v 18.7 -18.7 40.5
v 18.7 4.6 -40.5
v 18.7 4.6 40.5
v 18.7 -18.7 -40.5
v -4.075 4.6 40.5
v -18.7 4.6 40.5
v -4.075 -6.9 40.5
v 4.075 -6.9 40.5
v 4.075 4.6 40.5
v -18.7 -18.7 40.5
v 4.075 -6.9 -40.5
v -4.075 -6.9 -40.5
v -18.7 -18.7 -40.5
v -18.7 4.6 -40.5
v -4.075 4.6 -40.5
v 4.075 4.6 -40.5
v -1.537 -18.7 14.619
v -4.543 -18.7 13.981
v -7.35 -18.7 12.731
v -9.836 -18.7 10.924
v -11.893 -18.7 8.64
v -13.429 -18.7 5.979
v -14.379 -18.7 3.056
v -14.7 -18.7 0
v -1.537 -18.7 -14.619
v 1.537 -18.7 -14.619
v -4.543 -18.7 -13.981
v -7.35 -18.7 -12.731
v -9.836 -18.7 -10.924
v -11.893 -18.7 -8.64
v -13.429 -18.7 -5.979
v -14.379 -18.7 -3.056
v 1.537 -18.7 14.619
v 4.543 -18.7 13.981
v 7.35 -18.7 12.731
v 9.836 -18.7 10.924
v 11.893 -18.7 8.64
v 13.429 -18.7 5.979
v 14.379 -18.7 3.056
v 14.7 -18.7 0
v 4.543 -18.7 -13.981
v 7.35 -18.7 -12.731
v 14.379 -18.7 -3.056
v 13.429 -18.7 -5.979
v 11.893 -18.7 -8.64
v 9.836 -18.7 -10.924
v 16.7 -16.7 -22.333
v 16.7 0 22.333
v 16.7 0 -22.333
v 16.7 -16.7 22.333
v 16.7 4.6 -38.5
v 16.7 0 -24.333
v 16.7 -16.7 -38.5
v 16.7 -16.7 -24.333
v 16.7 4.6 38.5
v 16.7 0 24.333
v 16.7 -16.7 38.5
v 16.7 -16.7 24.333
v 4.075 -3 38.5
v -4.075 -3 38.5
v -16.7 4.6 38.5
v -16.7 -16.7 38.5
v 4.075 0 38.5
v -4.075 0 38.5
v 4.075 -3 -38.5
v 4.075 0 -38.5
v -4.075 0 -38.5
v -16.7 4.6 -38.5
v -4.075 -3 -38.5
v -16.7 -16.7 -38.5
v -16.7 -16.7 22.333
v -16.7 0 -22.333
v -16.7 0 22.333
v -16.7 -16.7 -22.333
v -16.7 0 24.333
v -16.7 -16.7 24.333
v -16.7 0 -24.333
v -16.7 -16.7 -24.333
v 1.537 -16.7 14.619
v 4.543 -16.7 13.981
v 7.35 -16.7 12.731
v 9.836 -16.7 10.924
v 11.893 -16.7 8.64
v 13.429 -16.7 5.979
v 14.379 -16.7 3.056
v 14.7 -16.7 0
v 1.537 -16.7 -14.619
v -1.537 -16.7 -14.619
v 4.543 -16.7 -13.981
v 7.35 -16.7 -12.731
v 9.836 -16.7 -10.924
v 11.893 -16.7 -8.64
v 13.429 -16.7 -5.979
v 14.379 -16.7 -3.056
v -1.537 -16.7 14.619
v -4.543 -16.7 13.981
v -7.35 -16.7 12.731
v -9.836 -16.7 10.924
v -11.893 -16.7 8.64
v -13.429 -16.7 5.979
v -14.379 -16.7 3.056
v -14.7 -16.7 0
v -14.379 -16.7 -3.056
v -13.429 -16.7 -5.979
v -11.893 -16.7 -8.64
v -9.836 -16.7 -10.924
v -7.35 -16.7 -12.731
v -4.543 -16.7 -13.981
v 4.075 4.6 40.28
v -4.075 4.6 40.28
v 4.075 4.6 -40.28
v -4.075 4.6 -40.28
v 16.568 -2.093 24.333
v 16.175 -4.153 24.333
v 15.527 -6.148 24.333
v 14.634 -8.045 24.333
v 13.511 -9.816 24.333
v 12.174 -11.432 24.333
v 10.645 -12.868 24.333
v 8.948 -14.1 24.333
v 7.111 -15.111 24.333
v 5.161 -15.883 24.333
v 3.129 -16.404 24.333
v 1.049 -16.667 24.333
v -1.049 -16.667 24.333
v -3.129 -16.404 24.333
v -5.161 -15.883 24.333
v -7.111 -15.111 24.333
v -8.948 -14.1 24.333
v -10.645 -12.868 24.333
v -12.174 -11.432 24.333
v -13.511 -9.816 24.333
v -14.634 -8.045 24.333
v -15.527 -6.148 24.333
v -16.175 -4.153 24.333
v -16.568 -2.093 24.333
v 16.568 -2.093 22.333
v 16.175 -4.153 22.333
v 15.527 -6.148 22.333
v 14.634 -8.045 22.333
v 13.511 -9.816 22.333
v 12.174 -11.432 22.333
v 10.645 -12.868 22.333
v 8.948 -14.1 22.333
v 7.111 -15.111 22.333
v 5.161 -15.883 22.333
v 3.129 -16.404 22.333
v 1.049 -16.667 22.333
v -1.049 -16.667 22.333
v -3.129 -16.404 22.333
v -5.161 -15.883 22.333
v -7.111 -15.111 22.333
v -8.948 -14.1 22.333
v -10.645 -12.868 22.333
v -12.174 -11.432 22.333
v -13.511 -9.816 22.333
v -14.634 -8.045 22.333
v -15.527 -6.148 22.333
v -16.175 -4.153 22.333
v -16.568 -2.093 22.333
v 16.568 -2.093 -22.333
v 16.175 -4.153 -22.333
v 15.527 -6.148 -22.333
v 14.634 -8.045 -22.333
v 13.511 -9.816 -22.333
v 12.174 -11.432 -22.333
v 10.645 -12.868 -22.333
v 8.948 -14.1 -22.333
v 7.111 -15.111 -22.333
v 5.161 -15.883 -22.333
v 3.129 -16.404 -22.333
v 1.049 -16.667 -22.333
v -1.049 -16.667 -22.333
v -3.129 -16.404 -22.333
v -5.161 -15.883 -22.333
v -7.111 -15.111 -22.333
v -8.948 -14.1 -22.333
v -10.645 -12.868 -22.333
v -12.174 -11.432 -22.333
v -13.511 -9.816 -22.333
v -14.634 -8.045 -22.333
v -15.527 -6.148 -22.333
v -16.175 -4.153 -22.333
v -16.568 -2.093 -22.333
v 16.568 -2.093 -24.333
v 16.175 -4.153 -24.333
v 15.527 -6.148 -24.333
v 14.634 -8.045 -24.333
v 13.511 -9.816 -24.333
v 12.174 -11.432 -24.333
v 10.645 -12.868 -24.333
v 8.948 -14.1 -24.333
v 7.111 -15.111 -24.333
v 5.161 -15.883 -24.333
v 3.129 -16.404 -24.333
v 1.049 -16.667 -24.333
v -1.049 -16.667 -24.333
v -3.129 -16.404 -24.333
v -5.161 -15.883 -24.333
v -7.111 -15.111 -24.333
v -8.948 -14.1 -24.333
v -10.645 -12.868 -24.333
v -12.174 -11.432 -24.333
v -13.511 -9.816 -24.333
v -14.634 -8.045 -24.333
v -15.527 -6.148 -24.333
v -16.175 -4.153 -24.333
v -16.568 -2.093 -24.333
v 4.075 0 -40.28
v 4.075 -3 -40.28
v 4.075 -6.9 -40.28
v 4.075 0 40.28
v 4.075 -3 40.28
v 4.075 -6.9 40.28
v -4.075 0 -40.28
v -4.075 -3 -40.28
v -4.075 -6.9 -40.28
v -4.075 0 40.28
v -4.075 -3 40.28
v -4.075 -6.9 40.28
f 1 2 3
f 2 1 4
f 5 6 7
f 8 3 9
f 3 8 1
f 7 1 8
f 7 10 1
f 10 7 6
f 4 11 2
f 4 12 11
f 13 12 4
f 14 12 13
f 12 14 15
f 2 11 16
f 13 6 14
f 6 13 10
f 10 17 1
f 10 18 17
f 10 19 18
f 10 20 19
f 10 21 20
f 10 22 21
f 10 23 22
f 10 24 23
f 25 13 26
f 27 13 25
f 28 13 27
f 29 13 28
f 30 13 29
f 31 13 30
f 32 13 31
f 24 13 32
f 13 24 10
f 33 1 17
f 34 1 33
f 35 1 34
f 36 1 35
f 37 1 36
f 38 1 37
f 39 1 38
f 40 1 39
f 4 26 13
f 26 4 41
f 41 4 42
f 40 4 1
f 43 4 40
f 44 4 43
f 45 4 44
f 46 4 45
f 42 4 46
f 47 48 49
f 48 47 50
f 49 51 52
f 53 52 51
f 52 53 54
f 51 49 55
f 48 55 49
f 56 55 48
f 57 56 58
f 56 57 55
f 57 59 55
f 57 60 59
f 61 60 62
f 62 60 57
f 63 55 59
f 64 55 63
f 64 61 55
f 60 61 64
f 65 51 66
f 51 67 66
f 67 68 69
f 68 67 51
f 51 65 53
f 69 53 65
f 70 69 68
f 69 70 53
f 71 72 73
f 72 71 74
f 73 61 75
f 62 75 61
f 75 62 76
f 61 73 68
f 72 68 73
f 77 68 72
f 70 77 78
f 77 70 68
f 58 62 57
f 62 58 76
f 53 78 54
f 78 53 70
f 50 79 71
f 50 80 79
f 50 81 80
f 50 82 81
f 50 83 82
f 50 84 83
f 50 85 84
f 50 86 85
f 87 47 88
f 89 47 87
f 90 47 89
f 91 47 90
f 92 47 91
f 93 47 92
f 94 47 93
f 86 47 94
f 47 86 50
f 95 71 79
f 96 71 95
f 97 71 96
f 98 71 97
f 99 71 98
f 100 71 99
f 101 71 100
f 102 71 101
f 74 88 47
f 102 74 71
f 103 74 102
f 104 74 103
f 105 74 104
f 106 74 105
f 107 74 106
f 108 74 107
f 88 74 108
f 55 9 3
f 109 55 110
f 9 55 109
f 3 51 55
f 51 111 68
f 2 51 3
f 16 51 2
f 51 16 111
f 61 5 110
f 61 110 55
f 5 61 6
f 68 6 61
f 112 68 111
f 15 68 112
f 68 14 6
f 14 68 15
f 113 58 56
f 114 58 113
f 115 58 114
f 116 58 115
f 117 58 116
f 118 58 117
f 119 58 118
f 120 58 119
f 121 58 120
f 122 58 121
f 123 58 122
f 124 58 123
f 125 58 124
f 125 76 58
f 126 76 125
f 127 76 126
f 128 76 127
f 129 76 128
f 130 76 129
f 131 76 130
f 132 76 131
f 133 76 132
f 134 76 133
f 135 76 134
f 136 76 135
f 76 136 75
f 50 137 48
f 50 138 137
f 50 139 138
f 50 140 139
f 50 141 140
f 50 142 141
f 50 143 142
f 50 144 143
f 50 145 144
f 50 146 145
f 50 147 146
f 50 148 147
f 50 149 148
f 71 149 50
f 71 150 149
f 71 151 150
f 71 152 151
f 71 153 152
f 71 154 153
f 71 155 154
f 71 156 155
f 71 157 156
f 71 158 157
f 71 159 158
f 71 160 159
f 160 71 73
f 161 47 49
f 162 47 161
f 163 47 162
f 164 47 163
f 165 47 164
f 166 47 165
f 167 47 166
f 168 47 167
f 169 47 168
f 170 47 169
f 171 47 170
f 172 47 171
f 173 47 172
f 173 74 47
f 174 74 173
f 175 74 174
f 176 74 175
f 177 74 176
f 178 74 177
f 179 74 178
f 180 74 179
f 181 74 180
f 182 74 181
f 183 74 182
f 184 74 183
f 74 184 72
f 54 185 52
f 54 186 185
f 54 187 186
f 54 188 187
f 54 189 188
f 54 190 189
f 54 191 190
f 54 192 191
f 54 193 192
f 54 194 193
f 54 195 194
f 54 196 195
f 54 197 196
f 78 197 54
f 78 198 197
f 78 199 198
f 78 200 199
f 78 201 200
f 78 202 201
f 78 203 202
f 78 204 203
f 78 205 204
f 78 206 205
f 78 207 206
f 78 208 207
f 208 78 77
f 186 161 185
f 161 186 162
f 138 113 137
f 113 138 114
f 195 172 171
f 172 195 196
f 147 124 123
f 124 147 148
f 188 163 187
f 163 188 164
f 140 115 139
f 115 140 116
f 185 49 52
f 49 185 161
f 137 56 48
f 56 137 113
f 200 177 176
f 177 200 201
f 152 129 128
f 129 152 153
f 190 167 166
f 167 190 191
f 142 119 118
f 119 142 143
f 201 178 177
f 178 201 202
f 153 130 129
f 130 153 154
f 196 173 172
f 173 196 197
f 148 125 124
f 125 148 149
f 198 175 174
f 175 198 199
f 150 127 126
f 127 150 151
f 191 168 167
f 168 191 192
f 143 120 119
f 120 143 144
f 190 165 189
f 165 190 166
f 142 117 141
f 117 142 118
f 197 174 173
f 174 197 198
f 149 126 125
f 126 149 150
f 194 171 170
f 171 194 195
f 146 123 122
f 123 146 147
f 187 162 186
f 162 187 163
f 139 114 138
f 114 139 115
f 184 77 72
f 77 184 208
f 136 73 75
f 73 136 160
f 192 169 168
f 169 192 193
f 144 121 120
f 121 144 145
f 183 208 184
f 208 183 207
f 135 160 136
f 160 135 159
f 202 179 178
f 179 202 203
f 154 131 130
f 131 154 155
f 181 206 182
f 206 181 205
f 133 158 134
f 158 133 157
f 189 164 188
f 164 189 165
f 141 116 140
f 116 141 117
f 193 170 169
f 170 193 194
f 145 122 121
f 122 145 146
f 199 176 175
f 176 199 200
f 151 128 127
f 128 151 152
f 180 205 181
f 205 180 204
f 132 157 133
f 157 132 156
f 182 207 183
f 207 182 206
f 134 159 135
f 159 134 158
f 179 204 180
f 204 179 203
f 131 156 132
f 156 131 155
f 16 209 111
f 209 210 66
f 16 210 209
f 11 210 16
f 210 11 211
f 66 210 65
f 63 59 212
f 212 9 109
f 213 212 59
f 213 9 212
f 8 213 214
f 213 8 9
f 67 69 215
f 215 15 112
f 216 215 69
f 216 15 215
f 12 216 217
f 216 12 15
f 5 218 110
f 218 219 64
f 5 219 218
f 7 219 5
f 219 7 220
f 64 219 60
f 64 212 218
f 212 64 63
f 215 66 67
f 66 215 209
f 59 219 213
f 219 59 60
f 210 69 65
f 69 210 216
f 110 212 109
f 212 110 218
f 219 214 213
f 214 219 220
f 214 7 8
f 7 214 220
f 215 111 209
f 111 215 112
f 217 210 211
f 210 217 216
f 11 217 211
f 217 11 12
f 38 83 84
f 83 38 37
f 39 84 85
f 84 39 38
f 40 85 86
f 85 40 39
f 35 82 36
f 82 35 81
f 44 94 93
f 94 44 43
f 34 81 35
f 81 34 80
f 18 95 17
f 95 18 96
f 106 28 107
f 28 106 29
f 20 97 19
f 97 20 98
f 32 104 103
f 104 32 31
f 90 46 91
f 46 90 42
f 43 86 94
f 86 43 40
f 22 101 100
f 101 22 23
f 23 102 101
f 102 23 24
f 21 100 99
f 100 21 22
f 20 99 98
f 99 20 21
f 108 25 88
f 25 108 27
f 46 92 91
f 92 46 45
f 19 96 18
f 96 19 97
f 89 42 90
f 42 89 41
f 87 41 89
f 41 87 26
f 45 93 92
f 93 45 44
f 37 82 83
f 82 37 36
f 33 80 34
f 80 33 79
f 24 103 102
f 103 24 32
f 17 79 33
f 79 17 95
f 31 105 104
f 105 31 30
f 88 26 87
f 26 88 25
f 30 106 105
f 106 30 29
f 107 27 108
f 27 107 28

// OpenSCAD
// printer-specific fudge setting to allow enough clearance
diameter_fudge = 0.4;

// cell dimensions, measured to 32860 cell in-hand
cell_diameter = 33 + diameter_fudge;
cell_height = 70;

// configured for Keystone "209" clip:
clip_gap = 3.5; // gap between wall of holder and battery where spring clip sits, compressed size
clip_wall = 1.78; // width of printed wall onto which clip clips
clip_top_wall_to_hook = 4.6; // minimum distance between edge of clip wall and hook on clip
clip_width = 8.15;
clip_height = 11.5;

// holder dimensions
wall_thickness = 2.0;

// calculated dimensions
box_width = cell_diameter + wall_thickness*2;
box_height = cell_height + clip_gap*2 + wall_thickness*2;
box_depth = cell_diameter + wall_thickness*2;
hole_width = cell_diameter;
hole_height = cell_height + clip_gap*2;
hole_depth = cell_diameter;

// transparent battery image
module battery(cell_height, cell_diameter) {
    cylinder(h=cell_height, d=cell_diameter, center=true, $fn=50);
}
//%battery(cell_height, cell_diameter);


difference(){
    // positive shapes
    union(){
        // main box shape
        difference(){
            cube([box_width, box_depth, box_height], center=true); // box outside
            cube([hole_width, hole_depth, hole_height], center=true); // box cutout
            translate([0,box_depth/2+clip_top_wall_to_hook,0]){cube([box_width+1, box_depth, box_height+1], center=true);} // box top cut off
        }
        // mid supports
        translate([0,-box_depth/4,cell_height/3]){cube([box_width, box_depth/2, wall_thickness],center=true);}
        translate([0,-box_depth/4,-cell_height/3]){cube([box_width, box_depth/2, wall_thickness],center=true);}
    }
    // negative shapes
    union(){
        battery(cell_height, cell_diameter);
        // clip hook hole
        translate([0,-3/2,0]){cube([clip_width, 3, box_height+1], center=true);}
        // clip indentations
        notch_depth = wall_thickness-clip_wall;
        translate([0,-(clip_height/2)+clip_top_wall_to_hook,box_height/2-notch_depth/2]){cube([clip_width,clip_height,notch_depth],center=true);}
        translate([0,-(clip_height/2)+clip_top_wall_to_hook,-box_height/2+notch_depth/2]){cube([clip_width,clip_height,notch_depth],center=true);}
        // speed holes
        rotate([90,0,0]){cylinder(h=box_width+1, d=hole_width-4,center=true);}
    }
}
